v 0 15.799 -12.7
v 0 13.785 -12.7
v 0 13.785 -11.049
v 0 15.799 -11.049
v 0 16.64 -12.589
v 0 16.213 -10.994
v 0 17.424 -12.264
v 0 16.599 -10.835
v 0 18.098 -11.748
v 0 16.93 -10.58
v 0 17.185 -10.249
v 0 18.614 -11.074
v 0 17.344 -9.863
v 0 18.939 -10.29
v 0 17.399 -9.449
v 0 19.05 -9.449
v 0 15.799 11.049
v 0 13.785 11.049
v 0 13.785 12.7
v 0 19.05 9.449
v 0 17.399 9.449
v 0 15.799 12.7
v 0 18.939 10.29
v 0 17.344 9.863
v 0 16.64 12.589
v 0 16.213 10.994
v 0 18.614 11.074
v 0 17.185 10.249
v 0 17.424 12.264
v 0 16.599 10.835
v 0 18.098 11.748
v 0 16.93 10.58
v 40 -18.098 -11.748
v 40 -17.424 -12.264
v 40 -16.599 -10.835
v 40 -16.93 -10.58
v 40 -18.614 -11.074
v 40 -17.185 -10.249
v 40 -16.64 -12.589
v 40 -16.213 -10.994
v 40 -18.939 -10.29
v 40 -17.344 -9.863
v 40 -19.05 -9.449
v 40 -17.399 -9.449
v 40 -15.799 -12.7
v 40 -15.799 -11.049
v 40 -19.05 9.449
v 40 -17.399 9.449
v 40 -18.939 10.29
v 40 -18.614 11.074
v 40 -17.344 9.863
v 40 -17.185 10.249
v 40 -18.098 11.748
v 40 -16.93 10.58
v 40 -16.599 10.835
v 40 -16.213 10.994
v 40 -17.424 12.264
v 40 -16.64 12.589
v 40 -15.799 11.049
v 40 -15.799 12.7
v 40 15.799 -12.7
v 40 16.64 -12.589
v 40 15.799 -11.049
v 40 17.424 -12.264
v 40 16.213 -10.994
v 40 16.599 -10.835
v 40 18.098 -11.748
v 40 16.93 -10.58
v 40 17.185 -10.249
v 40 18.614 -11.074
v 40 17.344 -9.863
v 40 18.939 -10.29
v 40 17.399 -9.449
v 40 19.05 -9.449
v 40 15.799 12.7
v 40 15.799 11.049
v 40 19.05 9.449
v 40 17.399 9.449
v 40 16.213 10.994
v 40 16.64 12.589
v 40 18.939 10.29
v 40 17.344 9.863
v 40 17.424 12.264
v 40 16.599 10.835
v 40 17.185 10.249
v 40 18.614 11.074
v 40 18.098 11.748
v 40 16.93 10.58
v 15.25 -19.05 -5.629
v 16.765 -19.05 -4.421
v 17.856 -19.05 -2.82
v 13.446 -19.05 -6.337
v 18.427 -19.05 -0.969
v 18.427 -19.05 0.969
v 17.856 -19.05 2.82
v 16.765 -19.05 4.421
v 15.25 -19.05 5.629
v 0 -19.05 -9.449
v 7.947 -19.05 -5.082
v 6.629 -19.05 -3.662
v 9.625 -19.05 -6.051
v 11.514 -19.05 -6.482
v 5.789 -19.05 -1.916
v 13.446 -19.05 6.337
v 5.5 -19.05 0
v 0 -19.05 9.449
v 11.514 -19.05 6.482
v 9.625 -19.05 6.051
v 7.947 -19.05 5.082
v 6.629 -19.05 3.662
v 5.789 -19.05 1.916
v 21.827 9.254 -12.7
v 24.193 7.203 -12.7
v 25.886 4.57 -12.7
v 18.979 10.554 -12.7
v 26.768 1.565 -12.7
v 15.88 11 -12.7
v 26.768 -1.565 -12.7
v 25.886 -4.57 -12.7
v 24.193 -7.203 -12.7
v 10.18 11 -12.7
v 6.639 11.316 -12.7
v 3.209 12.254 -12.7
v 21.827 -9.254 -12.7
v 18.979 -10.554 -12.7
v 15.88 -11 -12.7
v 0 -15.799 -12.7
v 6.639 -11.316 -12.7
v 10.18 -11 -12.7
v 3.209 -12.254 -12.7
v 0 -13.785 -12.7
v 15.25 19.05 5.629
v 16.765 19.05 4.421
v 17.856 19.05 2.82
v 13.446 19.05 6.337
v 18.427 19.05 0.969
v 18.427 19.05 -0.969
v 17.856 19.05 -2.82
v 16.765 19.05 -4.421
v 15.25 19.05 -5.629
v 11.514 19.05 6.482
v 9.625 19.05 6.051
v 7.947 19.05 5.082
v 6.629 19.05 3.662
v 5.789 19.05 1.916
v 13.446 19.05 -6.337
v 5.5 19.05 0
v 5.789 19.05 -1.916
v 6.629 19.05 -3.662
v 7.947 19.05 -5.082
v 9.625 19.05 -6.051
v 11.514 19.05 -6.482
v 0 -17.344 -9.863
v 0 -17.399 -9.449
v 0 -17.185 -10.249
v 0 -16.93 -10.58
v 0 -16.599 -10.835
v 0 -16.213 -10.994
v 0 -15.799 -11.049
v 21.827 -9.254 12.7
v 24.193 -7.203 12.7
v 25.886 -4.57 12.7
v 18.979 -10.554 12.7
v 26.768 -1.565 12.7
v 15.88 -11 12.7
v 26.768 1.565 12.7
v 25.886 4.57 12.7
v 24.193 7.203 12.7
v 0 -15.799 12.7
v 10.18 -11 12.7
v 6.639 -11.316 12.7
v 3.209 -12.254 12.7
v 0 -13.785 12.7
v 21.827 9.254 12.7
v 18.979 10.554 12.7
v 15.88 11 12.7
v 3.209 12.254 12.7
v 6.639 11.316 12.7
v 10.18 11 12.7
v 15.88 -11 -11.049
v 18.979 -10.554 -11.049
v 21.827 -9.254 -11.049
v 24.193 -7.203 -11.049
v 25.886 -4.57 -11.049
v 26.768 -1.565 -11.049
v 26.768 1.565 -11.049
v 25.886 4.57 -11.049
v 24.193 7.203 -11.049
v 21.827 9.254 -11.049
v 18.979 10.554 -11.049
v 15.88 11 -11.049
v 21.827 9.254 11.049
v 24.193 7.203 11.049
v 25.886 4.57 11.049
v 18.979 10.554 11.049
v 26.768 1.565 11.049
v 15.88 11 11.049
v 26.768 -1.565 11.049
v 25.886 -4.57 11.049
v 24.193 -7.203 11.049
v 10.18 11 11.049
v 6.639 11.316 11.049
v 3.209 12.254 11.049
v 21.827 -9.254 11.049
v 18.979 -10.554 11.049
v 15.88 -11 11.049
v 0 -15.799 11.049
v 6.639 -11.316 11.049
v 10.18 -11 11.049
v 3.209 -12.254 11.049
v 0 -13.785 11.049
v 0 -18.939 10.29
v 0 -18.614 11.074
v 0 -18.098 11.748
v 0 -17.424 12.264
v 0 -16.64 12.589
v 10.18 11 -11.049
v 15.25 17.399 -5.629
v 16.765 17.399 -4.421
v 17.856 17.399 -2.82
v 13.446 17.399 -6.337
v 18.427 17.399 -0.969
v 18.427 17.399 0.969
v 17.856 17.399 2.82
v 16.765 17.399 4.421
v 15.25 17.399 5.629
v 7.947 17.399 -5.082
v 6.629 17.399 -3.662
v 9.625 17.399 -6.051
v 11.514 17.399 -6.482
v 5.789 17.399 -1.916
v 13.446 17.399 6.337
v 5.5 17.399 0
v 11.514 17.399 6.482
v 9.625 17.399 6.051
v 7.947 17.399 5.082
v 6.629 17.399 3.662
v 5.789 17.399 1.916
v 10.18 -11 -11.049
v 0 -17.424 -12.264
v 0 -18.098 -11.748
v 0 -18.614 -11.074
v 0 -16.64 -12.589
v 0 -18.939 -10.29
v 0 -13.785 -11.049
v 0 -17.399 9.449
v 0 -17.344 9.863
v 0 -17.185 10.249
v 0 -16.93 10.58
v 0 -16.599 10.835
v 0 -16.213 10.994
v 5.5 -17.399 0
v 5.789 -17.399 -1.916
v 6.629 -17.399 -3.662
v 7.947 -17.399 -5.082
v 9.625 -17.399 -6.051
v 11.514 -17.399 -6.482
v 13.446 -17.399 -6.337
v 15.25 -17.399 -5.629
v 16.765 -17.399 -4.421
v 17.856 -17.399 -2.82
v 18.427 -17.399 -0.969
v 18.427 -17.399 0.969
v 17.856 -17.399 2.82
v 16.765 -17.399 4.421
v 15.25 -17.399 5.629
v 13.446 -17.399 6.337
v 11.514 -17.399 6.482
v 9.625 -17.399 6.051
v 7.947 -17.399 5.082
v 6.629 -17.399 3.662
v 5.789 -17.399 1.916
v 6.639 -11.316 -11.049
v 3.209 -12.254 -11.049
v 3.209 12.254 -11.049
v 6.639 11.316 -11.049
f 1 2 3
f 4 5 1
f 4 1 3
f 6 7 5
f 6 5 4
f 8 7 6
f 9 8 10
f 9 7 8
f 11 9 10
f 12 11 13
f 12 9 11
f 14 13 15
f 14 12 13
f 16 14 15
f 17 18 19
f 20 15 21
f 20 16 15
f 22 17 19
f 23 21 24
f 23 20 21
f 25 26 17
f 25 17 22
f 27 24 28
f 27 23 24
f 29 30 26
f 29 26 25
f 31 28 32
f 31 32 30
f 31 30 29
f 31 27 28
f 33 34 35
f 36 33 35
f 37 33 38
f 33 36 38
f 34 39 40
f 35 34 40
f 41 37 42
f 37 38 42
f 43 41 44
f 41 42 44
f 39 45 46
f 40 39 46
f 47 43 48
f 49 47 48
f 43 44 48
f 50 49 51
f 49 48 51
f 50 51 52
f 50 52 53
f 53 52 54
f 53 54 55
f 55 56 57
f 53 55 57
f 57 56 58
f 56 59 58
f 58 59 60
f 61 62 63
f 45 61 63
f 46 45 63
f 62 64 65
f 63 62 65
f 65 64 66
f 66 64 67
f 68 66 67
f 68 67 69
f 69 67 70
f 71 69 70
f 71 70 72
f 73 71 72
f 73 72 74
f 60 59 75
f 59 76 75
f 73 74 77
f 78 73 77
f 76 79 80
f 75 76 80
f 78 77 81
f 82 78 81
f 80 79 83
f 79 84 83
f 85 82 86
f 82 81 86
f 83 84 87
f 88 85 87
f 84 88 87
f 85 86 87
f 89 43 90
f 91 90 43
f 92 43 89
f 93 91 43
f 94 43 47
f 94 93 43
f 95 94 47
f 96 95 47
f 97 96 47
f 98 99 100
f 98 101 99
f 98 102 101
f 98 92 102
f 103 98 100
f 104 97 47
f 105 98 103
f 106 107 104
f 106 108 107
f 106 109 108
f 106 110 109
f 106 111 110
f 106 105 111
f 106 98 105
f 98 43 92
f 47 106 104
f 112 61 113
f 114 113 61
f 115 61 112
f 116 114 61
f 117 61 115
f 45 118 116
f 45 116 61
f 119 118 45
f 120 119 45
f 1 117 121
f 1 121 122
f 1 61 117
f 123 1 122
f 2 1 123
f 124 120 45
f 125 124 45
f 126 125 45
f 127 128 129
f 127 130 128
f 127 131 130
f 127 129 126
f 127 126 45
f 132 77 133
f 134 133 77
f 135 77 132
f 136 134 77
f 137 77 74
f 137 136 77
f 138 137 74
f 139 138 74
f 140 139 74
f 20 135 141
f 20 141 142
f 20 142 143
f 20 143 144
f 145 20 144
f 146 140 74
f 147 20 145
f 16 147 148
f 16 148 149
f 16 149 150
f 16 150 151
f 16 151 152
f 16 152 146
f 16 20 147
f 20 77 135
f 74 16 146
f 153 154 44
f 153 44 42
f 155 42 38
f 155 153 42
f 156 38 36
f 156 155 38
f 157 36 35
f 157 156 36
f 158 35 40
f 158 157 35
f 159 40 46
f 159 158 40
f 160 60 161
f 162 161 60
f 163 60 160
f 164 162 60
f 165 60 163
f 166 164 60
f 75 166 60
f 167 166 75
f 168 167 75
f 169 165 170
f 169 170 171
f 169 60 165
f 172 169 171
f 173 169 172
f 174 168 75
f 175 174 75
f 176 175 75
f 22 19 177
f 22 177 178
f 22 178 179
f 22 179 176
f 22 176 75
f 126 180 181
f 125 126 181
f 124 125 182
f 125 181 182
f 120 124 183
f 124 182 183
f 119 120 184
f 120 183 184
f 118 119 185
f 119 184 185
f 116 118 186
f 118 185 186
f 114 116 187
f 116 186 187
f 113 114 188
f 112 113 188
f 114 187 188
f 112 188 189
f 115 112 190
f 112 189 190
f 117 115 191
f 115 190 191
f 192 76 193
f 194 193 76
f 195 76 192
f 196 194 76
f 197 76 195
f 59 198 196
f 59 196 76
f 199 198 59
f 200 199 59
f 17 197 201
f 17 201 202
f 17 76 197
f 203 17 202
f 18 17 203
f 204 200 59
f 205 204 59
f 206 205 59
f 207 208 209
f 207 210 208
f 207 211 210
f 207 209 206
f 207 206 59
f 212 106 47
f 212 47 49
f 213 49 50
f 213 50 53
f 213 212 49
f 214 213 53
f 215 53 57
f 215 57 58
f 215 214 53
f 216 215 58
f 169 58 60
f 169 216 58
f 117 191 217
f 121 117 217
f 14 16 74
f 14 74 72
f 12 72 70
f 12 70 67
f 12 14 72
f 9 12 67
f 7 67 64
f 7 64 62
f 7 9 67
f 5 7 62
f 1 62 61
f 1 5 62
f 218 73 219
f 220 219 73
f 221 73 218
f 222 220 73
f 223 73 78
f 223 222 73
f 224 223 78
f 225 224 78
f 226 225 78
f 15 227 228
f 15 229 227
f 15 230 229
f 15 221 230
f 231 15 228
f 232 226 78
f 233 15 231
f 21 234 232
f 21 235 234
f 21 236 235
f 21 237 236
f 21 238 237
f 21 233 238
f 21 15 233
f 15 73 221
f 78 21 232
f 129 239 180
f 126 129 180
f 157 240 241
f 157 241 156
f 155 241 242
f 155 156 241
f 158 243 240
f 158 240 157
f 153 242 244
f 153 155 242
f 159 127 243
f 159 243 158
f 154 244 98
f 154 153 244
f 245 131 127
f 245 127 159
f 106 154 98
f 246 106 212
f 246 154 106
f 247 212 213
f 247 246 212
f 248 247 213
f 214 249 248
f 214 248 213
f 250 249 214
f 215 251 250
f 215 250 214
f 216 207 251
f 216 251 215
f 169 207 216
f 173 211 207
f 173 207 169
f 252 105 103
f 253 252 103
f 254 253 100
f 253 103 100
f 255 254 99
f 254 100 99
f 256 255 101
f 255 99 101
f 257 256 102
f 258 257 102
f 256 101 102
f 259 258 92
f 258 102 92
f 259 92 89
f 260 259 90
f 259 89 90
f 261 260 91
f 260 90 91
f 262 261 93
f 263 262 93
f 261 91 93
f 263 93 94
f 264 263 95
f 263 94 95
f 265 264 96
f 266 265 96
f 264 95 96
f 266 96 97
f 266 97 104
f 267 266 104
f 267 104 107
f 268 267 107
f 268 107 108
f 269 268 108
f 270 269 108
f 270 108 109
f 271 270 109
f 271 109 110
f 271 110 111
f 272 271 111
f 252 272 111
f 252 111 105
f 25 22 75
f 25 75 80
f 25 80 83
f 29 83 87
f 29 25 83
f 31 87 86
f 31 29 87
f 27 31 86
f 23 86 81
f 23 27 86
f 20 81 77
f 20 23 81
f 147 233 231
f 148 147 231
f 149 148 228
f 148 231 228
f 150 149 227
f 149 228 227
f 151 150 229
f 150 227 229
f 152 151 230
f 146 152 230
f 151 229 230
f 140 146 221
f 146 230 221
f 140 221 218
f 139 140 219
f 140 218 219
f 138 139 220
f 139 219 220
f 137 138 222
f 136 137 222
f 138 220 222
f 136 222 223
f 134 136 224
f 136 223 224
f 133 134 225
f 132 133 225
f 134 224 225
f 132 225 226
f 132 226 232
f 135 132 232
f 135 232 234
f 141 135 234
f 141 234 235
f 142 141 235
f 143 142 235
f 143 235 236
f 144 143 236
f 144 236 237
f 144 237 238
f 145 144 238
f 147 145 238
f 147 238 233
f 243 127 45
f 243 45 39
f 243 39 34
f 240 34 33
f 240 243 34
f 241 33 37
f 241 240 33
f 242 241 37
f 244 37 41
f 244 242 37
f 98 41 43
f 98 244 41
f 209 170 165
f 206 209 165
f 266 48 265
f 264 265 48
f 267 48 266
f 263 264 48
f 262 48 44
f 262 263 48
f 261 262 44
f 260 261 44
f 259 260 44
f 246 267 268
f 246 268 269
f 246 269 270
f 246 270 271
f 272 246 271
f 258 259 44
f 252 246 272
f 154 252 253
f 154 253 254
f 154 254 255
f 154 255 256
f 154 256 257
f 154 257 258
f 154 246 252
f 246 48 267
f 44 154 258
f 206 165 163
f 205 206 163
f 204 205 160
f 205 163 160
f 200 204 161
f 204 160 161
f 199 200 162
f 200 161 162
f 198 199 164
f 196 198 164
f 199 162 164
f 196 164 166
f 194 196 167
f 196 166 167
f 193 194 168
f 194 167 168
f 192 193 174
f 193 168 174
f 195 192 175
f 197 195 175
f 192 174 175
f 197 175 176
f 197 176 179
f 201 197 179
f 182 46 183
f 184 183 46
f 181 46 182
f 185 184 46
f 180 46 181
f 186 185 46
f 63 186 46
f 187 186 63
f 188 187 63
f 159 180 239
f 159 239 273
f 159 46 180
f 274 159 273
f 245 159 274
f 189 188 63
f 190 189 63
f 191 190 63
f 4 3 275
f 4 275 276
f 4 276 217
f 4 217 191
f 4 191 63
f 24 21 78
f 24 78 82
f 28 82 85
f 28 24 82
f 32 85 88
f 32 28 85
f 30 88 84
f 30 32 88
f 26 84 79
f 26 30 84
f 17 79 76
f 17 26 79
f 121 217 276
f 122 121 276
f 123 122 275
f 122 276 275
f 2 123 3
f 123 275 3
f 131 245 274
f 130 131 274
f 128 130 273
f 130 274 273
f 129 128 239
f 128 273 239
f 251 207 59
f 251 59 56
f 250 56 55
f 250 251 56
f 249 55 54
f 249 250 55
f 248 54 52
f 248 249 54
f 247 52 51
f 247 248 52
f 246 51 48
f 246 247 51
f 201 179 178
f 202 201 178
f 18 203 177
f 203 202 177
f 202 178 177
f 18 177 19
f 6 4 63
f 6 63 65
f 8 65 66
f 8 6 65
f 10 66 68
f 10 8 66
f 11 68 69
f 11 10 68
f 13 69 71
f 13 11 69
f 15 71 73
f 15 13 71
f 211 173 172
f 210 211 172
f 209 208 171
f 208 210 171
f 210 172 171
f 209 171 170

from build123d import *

# Parameters (mm, degrees)
FSAE_CHASSIS_1_5_X_1_INCH_RECT_1_DEPTH = 40
CUT_EXTRUDE1_DEPTH                     = 52.069193258
CUT_EXTRUDE1_DEPTH_BACK                = 52.069193258
F_13_0_13_DIAMETER_HOLE2_D             = 13


with BuildPart() as part:
    # Sketch15 → Fsae chassis 1_5 X 1 INCH RECT(1) (new body)
    with BuildSketch(Plane(origin=(0, 0, 0), x_dir=(0, 0, -1), z_dir=(1, 0, 0))):
        with BuildLine():
            Line((-9.4488, 19.05), (9.4488, 19.05))
            ThreePointArc((9.4488, 19.05), (11.747745567, 18.097745567), (12.7, 15.7988))
            Line((12.7, 15.7988), (12.7, -15.7988))
            ThreePointArc((12.7, -15.7988), (11.747745567, -18.097745567), (9.4488, -19.05))
            Line((9.4488, -19.05), (-9.4488, -19.05))
            ThreePointArc((-9.4488, -19.05), (-11.747745567, -18.097745567), (-12.7, -15.7988))
            Line((-12.7, -15.7988), (-12.7, 15.7988))
            ThreePointArc((-12.7, 15.7988), (-11.747745567, 18.097745567), (-9.4488, 19.05))
        make_face()
        with BuildLine():
            Line((-9.4488, -17.399), (9.4488, -17.399))
            ThreePointArc((9.4488, -17.399), (10.580312271, -16.930312271), (11.049, -15.7988))
            Line((11.049, -15.7988), (11.049, 15.7988))
            ThreePointArc((11.049, 15.7988), (10.580312271, 16.930312271), (9.4488, 17.399))
            Line((9.4488, 17.399), (-9.4488, 17.399))
            ThreePointArc((-9.4488, 17.399), (-10.580312271, 16.930312271), (-11.049, 15.7988))
            Line((-11.049, 15.7988), (-11.049, -15.7988))
            ThreePointArc((-11.049, -15.7988), (-10.580312271, -16.930312271), (-9.4488, -17.399))
        make_face(mode=Mode.SUBTRACT)
    extrude(amount=FSAE_CHASSIS_1_5_X_1_INCH_RECT_1_DEPTH)

    # Sketch16 → Cut-Extrude1 (cut, two sides: drawn at the far end of the back side and taken through both)
    with BuildSketch(Plane(origin=(0, 0, -12.7), x_dir=(-1, 0, 0), z_dir=(0, 0, -1)).offset(-CUT_EXTRUDE1_DEPTH_BACK)):
        with BuildLine():
            Line((-15.88, 11), (-10.18, 11))
            ThreePointArc((-10.18, 11), (-4.903003105, 11.708724672), (0, 13.784669623))
            Line((0, 13.784669623), (0, -13.784669623))
            ThreePointArc((0, -13.784669623), (-4.903003105, -11.708724672), (-10.18, -11))
            Line((-10.18, -11), (-15.88, -11))
            ThreePointArc((-15.88, -11), (-26.88, 0), (-15.88, 11))
        make_face()
    extrude(amount=CUT_EXTRUDE1_DEPTH + CUT_EXTRUDE1_DEPTH_BACK, mode=Mode.SUBTRACT)

    # Ø13.0 (13) Diameter Hole2 (through all)
    with Locations(Plane(origin=(0, 19.05, 0), x_dir=(1, 0, 0), z_dir=(0, 1, 0))):
        with Locations((12, 0)):
            Hole(F_13_0_13_DIAMETER_HOLE2_D / 2)


solid = part.part
